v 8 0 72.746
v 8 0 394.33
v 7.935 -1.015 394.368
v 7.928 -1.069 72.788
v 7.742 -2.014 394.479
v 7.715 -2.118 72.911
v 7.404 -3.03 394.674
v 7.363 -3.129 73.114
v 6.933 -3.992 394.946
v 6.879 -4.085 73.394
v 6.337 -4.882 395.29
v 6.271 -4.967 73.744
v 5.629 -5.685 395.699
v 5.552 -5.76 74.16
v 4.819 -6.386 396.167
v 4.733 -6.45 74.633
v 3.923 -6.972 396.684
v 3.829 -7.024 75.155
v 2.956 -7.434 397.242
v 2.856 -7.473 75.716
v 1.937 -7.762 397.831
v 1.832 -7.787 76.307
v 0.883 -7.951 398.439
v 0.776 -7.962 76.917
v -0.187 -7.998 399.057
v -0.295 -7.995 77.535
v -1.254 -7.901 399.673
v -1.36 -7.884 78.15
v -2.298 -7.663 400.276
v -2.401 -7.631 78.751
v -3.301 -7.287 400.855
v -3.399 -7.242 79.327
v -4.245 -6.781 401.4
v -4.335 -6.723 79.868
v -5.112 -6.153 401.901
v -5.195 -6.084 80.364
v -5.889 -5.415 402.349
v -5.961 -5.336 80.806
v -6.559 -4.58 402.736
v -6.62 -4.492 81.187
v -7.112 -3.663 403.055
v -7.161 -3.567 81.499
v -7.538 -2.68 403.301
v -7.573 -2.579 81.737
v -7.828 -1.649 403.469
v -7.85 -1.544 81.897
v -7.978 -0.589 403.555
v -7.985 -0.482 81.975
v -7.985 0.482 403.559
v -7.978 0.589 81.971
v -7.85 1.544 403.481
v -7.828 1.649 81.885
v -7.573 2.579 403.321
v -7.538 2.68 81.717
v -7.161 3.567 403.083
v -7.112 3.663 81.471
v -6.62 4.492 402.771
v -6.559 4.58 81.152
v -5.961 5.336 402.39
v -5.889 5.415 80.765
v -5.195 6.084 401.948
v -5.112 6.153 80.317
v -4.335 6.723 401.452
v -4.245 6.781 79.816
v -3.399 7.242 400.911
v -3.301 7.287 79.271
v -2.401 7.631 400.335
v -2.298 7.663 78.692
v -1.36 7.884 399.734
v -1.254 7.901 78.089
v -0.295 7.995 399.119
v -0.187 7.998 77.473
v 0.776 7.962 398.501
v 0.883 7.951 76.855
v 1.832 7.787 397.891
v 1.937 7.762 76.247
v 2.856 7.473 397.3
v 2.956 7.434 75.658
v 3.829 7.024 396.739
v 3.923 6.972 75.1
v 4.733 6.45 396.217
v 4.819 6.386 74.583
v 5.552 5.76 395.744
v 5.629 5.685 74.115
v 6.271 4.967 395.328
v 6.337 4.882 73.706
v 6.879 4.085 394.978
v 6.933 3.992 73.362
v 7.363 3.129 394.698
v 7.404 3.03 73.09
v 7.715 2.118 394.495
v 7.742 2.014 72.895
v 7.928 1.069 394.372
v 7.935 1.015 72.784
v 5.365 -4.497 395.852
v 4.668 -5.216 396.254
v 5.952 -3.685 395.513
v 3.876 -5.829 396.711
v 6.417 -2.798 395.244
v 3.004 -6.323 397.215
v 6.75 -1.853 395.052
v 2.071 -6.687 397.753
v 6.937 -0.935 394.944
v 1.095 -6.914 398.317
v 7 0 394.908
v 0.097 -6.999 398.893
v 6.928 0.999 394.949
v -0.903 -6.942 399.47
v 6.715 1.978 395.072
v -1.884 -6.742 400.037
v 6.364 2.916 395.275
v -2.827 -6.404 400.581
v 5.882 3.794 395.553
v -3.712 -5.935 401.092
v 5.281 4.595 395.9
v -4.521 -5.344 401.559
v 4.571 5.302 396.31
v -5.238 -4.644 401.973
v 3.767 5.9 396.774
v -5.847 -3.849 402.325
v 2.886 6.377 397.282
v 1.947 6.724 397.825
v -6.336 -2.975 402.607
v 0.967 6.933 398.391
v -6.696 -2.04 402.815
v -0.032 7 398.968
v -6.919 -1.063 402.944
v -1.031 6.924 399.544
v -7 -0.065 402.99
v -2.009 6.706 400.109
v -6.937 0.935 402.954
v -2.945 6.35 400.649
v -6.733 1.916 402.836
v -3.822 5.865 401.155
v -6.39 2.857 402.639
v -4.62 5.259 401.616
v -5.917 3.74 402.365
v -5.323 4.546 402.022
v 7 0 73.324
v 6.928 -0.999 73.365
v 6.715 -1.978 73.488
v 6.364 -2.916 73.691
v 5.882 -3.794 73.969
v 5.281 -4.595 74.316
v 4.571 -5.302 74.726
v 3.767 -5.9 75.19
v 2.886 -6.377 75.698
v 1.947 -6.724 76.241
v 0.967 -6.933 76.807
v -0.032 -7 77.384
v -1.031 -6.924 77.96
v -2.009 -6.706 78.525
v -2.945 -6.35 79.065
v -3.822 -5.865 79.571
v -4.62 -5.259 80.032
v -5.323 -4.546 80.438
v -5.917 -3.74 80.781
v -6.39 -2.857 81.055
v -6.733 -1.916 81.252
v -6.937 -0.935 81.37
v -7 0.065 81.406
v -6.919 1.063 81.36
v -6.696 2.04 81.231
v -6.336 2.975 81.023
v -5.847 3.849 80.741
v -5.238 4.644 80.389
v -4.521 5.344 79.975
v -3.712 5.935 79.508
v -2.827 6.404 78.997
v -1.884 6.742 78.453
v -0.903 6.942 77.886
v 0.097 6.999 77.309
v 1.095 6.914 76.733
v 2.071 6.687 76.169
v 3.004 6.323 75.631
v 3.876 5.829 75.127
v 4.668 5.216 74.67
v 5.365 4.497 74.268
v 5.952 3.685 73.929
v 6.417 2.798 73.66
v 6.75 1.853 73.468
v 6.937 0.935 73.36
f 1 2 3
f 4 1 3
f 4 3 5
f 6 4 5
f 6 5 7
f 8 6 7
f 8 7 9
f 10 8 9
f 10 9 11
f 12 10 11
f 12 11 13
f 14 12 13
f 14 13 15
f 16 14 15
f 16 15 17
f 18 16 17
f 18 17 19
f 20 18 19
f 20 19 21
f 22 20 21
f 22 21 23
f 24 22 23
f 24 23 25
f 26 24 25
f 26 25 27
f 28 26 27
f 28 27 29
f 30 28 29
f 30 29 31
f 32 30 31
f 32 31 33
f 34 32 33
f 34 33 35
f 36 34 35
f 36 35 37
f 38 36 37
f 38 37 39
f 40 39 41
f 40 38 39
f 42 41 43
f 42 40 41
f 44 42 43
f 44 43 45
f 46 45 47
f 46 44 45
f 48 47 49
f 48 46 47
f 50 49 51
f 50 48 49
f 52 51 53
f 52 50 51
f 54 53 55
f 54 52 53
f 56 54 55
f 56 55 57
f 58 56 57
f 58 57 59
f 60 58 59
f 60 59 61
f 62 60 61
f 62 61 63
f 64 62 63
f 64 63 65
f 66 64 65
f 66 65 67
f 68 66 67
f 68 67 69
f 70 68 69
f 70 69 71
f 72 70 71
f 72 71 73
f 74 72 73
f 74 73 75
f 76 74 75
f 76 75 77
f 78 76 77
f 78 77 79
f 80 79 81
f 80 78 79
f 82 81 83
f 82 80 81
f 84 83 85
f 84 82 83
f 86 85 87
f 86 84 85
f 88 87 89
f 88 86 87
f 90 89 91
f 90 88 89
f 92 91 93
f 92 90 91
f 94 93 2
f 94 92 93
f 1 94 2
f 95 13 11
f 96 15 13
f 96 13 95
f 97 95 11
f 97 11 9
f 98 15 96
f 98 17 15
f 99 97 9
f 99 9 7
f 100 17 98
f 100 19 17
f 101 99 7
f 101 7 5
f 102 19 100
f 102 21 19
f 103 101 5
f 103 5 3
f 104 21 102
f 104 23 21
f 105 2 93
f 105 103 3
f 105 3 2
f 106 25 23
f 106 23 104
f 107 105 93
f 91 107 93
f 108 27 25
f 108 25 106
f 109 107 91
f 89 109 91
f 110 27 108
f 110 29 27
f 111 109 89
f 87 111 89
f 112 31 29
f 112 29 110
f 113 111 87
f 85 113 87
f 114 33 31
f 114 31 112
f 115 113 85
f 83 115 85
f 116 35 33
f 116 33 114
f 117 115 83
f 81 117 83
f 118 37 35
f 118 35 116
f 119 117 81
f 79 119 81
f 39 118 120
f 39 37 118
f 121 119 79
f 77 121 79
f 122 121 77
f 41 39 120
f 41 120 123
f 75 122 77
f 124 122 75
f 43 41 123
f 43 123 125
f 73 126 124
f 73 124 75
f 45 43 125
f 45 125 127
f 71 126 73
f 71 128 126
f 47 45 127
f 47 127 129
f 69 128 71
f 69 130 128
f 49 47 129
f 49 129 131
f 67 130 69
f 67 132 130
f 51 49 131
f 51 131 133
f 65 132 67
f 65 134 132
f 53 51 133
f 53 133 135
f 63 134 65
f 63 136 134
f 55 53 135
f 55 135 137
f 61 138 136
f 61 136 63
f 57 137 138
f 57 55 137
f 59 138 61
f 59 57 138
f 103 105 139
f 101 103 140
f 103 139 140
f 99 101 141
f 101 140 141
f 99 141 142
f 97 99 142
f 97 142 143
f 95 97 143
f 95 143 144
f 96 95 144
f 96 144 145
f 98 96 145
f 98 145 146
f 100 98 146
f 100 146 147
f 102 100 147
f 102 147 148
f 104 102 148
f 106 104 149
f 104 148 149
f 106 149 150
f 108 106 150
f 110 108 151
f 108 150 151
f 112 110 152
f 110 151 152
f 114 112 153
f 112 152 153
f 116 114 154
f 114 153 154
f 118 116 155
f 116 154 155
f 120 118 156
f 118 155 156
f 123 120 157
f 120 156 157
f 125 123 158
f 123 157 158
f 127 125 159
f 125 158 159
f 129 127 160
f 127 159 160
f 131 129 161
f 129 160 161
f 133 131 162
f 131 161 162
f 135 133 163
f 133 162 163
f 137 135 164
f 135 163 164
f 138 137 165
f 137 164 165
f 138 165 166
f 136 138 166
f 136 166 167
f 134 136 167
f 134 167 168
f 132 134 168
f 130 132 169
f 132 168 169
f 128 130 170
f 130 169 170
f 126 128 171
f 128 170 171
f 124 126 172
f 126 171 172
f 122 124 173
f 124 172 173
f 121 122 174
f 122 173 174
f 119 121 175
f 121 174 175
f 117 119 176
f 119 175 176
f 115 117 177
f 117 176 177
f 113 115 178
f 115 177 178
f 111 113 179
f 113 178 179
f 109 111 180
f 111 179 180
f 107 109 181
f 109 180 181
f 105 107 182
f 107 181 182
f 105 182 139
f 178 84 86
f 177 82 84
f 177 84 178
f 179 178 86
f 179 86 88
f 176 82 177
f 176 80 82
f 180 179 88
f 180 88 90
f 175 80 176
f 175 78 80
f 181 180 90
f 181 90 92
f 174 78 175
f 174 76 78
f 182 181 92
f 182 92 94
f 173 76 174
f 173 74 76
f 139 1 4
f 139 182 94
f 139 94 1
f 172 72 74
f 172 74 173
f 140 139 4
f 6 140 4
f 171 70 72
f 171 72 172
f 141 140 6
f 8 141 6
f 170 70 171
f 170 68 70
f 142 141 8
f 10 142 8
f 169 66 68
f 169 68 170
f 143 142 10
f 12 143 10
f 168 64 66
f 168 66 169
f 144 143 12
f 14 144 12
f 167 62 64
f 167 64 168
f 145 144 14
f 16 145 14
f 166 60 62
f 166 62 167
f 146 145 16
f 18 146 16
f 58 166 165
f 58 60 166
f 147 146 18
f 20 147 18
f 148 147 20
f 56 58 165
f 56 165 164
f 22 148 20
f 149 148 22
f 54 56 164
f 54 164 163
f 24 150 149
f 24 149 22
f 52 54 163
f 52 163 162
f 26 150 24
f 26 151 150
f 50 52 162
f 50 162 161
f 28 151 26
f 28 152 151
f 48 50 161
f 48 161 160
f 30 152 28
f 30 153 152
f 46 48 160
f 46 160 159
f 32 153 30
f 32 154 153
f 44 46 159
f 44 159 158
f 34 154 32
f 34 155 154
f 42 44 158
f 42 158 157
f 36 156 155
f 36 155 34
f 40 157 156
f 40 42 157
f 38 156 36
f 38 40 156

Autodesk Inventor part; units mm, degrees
ref_plane "Начальная плоскость" through (0, 0, 72.7461) normal (0, 0, 1) x (1, 0, 0)
ref_plane "Конечная плоскость" through (0, 0, 403.5678) normal (0, 0, 1) x (1, 0, 0)
sketch "Эскиз" plane through (0, 0, 0) normal (0, 0, 1) x (1, 0, 0)
  circle A0 centre (0, 0) radius 7
  circle A1 centre (0, 0) radius 8
  dimension "d0" = 16
  dimension "d1" = 1
extrude "Тело" add sketch "Эскиз" along normal up to surface (330.8217 mm away) from surface at 72.7461
sketch "Sketch3" plane through (0, 0, 0) normal (0, 0, 1) x (1, 0, 0)
  line L0 (0, 0) -> (10, 0)
ref_plane "Work Plane3" through (0, 0, 0) normal (0, -1, 0) x (1, 0, 0)
sketch "Sketch4" plane through (0, 0, 0) normal (0, -1, 0) x (1, 0, 0)
  line L0 (-2, 72.7461) -> (12, 72.7461)
  line L1 (-2, 403.5678) -> (12, 403.5678)
  dimension "d7" = 330.8217
ref_plane "РабПлоскость4" through (560.3889, -19.75, 75.4083) normal (0.5, 0, 0.866) x (0.866, 0, -0.5)
split "Разделение1" plane through (560.3889, -19.75, 75.4083) removes the side toward (0.5, 0, 0.866)
ref_plane "РабПлоскость5" through (-156.5, -19.75, 167.7203) normal (-0.5, 0, -0.866) x (-0.866, 0, 0.5)
split "Разделение2" plane through (-156.5, -19.75, 167.7203) removes the side toward (-0.5, 0, -0.866)
equation "\"d0\" = G_H"
equation "\"d1\" = G_T"
equation "\"d2\" = G_L"
equation "\"G_H\" = 16"
equation "\"G_T\" = 1"
equation "\"G_L\" = d7"
equation "\"G_OFFSET_START\" = -72.74613"
equation "\"G_OFFSET_END\" = -35.21837"
equation "\"d4\" = -G_OFFSET_START"
equation "\"d5\" = G_OFFSET_END + B_L"
equation "\"B_L\" = 438.7862"
properties part number "Труба 16x1-330,82 ГОСТ 10704-91" material "Сталь, мягкая"
